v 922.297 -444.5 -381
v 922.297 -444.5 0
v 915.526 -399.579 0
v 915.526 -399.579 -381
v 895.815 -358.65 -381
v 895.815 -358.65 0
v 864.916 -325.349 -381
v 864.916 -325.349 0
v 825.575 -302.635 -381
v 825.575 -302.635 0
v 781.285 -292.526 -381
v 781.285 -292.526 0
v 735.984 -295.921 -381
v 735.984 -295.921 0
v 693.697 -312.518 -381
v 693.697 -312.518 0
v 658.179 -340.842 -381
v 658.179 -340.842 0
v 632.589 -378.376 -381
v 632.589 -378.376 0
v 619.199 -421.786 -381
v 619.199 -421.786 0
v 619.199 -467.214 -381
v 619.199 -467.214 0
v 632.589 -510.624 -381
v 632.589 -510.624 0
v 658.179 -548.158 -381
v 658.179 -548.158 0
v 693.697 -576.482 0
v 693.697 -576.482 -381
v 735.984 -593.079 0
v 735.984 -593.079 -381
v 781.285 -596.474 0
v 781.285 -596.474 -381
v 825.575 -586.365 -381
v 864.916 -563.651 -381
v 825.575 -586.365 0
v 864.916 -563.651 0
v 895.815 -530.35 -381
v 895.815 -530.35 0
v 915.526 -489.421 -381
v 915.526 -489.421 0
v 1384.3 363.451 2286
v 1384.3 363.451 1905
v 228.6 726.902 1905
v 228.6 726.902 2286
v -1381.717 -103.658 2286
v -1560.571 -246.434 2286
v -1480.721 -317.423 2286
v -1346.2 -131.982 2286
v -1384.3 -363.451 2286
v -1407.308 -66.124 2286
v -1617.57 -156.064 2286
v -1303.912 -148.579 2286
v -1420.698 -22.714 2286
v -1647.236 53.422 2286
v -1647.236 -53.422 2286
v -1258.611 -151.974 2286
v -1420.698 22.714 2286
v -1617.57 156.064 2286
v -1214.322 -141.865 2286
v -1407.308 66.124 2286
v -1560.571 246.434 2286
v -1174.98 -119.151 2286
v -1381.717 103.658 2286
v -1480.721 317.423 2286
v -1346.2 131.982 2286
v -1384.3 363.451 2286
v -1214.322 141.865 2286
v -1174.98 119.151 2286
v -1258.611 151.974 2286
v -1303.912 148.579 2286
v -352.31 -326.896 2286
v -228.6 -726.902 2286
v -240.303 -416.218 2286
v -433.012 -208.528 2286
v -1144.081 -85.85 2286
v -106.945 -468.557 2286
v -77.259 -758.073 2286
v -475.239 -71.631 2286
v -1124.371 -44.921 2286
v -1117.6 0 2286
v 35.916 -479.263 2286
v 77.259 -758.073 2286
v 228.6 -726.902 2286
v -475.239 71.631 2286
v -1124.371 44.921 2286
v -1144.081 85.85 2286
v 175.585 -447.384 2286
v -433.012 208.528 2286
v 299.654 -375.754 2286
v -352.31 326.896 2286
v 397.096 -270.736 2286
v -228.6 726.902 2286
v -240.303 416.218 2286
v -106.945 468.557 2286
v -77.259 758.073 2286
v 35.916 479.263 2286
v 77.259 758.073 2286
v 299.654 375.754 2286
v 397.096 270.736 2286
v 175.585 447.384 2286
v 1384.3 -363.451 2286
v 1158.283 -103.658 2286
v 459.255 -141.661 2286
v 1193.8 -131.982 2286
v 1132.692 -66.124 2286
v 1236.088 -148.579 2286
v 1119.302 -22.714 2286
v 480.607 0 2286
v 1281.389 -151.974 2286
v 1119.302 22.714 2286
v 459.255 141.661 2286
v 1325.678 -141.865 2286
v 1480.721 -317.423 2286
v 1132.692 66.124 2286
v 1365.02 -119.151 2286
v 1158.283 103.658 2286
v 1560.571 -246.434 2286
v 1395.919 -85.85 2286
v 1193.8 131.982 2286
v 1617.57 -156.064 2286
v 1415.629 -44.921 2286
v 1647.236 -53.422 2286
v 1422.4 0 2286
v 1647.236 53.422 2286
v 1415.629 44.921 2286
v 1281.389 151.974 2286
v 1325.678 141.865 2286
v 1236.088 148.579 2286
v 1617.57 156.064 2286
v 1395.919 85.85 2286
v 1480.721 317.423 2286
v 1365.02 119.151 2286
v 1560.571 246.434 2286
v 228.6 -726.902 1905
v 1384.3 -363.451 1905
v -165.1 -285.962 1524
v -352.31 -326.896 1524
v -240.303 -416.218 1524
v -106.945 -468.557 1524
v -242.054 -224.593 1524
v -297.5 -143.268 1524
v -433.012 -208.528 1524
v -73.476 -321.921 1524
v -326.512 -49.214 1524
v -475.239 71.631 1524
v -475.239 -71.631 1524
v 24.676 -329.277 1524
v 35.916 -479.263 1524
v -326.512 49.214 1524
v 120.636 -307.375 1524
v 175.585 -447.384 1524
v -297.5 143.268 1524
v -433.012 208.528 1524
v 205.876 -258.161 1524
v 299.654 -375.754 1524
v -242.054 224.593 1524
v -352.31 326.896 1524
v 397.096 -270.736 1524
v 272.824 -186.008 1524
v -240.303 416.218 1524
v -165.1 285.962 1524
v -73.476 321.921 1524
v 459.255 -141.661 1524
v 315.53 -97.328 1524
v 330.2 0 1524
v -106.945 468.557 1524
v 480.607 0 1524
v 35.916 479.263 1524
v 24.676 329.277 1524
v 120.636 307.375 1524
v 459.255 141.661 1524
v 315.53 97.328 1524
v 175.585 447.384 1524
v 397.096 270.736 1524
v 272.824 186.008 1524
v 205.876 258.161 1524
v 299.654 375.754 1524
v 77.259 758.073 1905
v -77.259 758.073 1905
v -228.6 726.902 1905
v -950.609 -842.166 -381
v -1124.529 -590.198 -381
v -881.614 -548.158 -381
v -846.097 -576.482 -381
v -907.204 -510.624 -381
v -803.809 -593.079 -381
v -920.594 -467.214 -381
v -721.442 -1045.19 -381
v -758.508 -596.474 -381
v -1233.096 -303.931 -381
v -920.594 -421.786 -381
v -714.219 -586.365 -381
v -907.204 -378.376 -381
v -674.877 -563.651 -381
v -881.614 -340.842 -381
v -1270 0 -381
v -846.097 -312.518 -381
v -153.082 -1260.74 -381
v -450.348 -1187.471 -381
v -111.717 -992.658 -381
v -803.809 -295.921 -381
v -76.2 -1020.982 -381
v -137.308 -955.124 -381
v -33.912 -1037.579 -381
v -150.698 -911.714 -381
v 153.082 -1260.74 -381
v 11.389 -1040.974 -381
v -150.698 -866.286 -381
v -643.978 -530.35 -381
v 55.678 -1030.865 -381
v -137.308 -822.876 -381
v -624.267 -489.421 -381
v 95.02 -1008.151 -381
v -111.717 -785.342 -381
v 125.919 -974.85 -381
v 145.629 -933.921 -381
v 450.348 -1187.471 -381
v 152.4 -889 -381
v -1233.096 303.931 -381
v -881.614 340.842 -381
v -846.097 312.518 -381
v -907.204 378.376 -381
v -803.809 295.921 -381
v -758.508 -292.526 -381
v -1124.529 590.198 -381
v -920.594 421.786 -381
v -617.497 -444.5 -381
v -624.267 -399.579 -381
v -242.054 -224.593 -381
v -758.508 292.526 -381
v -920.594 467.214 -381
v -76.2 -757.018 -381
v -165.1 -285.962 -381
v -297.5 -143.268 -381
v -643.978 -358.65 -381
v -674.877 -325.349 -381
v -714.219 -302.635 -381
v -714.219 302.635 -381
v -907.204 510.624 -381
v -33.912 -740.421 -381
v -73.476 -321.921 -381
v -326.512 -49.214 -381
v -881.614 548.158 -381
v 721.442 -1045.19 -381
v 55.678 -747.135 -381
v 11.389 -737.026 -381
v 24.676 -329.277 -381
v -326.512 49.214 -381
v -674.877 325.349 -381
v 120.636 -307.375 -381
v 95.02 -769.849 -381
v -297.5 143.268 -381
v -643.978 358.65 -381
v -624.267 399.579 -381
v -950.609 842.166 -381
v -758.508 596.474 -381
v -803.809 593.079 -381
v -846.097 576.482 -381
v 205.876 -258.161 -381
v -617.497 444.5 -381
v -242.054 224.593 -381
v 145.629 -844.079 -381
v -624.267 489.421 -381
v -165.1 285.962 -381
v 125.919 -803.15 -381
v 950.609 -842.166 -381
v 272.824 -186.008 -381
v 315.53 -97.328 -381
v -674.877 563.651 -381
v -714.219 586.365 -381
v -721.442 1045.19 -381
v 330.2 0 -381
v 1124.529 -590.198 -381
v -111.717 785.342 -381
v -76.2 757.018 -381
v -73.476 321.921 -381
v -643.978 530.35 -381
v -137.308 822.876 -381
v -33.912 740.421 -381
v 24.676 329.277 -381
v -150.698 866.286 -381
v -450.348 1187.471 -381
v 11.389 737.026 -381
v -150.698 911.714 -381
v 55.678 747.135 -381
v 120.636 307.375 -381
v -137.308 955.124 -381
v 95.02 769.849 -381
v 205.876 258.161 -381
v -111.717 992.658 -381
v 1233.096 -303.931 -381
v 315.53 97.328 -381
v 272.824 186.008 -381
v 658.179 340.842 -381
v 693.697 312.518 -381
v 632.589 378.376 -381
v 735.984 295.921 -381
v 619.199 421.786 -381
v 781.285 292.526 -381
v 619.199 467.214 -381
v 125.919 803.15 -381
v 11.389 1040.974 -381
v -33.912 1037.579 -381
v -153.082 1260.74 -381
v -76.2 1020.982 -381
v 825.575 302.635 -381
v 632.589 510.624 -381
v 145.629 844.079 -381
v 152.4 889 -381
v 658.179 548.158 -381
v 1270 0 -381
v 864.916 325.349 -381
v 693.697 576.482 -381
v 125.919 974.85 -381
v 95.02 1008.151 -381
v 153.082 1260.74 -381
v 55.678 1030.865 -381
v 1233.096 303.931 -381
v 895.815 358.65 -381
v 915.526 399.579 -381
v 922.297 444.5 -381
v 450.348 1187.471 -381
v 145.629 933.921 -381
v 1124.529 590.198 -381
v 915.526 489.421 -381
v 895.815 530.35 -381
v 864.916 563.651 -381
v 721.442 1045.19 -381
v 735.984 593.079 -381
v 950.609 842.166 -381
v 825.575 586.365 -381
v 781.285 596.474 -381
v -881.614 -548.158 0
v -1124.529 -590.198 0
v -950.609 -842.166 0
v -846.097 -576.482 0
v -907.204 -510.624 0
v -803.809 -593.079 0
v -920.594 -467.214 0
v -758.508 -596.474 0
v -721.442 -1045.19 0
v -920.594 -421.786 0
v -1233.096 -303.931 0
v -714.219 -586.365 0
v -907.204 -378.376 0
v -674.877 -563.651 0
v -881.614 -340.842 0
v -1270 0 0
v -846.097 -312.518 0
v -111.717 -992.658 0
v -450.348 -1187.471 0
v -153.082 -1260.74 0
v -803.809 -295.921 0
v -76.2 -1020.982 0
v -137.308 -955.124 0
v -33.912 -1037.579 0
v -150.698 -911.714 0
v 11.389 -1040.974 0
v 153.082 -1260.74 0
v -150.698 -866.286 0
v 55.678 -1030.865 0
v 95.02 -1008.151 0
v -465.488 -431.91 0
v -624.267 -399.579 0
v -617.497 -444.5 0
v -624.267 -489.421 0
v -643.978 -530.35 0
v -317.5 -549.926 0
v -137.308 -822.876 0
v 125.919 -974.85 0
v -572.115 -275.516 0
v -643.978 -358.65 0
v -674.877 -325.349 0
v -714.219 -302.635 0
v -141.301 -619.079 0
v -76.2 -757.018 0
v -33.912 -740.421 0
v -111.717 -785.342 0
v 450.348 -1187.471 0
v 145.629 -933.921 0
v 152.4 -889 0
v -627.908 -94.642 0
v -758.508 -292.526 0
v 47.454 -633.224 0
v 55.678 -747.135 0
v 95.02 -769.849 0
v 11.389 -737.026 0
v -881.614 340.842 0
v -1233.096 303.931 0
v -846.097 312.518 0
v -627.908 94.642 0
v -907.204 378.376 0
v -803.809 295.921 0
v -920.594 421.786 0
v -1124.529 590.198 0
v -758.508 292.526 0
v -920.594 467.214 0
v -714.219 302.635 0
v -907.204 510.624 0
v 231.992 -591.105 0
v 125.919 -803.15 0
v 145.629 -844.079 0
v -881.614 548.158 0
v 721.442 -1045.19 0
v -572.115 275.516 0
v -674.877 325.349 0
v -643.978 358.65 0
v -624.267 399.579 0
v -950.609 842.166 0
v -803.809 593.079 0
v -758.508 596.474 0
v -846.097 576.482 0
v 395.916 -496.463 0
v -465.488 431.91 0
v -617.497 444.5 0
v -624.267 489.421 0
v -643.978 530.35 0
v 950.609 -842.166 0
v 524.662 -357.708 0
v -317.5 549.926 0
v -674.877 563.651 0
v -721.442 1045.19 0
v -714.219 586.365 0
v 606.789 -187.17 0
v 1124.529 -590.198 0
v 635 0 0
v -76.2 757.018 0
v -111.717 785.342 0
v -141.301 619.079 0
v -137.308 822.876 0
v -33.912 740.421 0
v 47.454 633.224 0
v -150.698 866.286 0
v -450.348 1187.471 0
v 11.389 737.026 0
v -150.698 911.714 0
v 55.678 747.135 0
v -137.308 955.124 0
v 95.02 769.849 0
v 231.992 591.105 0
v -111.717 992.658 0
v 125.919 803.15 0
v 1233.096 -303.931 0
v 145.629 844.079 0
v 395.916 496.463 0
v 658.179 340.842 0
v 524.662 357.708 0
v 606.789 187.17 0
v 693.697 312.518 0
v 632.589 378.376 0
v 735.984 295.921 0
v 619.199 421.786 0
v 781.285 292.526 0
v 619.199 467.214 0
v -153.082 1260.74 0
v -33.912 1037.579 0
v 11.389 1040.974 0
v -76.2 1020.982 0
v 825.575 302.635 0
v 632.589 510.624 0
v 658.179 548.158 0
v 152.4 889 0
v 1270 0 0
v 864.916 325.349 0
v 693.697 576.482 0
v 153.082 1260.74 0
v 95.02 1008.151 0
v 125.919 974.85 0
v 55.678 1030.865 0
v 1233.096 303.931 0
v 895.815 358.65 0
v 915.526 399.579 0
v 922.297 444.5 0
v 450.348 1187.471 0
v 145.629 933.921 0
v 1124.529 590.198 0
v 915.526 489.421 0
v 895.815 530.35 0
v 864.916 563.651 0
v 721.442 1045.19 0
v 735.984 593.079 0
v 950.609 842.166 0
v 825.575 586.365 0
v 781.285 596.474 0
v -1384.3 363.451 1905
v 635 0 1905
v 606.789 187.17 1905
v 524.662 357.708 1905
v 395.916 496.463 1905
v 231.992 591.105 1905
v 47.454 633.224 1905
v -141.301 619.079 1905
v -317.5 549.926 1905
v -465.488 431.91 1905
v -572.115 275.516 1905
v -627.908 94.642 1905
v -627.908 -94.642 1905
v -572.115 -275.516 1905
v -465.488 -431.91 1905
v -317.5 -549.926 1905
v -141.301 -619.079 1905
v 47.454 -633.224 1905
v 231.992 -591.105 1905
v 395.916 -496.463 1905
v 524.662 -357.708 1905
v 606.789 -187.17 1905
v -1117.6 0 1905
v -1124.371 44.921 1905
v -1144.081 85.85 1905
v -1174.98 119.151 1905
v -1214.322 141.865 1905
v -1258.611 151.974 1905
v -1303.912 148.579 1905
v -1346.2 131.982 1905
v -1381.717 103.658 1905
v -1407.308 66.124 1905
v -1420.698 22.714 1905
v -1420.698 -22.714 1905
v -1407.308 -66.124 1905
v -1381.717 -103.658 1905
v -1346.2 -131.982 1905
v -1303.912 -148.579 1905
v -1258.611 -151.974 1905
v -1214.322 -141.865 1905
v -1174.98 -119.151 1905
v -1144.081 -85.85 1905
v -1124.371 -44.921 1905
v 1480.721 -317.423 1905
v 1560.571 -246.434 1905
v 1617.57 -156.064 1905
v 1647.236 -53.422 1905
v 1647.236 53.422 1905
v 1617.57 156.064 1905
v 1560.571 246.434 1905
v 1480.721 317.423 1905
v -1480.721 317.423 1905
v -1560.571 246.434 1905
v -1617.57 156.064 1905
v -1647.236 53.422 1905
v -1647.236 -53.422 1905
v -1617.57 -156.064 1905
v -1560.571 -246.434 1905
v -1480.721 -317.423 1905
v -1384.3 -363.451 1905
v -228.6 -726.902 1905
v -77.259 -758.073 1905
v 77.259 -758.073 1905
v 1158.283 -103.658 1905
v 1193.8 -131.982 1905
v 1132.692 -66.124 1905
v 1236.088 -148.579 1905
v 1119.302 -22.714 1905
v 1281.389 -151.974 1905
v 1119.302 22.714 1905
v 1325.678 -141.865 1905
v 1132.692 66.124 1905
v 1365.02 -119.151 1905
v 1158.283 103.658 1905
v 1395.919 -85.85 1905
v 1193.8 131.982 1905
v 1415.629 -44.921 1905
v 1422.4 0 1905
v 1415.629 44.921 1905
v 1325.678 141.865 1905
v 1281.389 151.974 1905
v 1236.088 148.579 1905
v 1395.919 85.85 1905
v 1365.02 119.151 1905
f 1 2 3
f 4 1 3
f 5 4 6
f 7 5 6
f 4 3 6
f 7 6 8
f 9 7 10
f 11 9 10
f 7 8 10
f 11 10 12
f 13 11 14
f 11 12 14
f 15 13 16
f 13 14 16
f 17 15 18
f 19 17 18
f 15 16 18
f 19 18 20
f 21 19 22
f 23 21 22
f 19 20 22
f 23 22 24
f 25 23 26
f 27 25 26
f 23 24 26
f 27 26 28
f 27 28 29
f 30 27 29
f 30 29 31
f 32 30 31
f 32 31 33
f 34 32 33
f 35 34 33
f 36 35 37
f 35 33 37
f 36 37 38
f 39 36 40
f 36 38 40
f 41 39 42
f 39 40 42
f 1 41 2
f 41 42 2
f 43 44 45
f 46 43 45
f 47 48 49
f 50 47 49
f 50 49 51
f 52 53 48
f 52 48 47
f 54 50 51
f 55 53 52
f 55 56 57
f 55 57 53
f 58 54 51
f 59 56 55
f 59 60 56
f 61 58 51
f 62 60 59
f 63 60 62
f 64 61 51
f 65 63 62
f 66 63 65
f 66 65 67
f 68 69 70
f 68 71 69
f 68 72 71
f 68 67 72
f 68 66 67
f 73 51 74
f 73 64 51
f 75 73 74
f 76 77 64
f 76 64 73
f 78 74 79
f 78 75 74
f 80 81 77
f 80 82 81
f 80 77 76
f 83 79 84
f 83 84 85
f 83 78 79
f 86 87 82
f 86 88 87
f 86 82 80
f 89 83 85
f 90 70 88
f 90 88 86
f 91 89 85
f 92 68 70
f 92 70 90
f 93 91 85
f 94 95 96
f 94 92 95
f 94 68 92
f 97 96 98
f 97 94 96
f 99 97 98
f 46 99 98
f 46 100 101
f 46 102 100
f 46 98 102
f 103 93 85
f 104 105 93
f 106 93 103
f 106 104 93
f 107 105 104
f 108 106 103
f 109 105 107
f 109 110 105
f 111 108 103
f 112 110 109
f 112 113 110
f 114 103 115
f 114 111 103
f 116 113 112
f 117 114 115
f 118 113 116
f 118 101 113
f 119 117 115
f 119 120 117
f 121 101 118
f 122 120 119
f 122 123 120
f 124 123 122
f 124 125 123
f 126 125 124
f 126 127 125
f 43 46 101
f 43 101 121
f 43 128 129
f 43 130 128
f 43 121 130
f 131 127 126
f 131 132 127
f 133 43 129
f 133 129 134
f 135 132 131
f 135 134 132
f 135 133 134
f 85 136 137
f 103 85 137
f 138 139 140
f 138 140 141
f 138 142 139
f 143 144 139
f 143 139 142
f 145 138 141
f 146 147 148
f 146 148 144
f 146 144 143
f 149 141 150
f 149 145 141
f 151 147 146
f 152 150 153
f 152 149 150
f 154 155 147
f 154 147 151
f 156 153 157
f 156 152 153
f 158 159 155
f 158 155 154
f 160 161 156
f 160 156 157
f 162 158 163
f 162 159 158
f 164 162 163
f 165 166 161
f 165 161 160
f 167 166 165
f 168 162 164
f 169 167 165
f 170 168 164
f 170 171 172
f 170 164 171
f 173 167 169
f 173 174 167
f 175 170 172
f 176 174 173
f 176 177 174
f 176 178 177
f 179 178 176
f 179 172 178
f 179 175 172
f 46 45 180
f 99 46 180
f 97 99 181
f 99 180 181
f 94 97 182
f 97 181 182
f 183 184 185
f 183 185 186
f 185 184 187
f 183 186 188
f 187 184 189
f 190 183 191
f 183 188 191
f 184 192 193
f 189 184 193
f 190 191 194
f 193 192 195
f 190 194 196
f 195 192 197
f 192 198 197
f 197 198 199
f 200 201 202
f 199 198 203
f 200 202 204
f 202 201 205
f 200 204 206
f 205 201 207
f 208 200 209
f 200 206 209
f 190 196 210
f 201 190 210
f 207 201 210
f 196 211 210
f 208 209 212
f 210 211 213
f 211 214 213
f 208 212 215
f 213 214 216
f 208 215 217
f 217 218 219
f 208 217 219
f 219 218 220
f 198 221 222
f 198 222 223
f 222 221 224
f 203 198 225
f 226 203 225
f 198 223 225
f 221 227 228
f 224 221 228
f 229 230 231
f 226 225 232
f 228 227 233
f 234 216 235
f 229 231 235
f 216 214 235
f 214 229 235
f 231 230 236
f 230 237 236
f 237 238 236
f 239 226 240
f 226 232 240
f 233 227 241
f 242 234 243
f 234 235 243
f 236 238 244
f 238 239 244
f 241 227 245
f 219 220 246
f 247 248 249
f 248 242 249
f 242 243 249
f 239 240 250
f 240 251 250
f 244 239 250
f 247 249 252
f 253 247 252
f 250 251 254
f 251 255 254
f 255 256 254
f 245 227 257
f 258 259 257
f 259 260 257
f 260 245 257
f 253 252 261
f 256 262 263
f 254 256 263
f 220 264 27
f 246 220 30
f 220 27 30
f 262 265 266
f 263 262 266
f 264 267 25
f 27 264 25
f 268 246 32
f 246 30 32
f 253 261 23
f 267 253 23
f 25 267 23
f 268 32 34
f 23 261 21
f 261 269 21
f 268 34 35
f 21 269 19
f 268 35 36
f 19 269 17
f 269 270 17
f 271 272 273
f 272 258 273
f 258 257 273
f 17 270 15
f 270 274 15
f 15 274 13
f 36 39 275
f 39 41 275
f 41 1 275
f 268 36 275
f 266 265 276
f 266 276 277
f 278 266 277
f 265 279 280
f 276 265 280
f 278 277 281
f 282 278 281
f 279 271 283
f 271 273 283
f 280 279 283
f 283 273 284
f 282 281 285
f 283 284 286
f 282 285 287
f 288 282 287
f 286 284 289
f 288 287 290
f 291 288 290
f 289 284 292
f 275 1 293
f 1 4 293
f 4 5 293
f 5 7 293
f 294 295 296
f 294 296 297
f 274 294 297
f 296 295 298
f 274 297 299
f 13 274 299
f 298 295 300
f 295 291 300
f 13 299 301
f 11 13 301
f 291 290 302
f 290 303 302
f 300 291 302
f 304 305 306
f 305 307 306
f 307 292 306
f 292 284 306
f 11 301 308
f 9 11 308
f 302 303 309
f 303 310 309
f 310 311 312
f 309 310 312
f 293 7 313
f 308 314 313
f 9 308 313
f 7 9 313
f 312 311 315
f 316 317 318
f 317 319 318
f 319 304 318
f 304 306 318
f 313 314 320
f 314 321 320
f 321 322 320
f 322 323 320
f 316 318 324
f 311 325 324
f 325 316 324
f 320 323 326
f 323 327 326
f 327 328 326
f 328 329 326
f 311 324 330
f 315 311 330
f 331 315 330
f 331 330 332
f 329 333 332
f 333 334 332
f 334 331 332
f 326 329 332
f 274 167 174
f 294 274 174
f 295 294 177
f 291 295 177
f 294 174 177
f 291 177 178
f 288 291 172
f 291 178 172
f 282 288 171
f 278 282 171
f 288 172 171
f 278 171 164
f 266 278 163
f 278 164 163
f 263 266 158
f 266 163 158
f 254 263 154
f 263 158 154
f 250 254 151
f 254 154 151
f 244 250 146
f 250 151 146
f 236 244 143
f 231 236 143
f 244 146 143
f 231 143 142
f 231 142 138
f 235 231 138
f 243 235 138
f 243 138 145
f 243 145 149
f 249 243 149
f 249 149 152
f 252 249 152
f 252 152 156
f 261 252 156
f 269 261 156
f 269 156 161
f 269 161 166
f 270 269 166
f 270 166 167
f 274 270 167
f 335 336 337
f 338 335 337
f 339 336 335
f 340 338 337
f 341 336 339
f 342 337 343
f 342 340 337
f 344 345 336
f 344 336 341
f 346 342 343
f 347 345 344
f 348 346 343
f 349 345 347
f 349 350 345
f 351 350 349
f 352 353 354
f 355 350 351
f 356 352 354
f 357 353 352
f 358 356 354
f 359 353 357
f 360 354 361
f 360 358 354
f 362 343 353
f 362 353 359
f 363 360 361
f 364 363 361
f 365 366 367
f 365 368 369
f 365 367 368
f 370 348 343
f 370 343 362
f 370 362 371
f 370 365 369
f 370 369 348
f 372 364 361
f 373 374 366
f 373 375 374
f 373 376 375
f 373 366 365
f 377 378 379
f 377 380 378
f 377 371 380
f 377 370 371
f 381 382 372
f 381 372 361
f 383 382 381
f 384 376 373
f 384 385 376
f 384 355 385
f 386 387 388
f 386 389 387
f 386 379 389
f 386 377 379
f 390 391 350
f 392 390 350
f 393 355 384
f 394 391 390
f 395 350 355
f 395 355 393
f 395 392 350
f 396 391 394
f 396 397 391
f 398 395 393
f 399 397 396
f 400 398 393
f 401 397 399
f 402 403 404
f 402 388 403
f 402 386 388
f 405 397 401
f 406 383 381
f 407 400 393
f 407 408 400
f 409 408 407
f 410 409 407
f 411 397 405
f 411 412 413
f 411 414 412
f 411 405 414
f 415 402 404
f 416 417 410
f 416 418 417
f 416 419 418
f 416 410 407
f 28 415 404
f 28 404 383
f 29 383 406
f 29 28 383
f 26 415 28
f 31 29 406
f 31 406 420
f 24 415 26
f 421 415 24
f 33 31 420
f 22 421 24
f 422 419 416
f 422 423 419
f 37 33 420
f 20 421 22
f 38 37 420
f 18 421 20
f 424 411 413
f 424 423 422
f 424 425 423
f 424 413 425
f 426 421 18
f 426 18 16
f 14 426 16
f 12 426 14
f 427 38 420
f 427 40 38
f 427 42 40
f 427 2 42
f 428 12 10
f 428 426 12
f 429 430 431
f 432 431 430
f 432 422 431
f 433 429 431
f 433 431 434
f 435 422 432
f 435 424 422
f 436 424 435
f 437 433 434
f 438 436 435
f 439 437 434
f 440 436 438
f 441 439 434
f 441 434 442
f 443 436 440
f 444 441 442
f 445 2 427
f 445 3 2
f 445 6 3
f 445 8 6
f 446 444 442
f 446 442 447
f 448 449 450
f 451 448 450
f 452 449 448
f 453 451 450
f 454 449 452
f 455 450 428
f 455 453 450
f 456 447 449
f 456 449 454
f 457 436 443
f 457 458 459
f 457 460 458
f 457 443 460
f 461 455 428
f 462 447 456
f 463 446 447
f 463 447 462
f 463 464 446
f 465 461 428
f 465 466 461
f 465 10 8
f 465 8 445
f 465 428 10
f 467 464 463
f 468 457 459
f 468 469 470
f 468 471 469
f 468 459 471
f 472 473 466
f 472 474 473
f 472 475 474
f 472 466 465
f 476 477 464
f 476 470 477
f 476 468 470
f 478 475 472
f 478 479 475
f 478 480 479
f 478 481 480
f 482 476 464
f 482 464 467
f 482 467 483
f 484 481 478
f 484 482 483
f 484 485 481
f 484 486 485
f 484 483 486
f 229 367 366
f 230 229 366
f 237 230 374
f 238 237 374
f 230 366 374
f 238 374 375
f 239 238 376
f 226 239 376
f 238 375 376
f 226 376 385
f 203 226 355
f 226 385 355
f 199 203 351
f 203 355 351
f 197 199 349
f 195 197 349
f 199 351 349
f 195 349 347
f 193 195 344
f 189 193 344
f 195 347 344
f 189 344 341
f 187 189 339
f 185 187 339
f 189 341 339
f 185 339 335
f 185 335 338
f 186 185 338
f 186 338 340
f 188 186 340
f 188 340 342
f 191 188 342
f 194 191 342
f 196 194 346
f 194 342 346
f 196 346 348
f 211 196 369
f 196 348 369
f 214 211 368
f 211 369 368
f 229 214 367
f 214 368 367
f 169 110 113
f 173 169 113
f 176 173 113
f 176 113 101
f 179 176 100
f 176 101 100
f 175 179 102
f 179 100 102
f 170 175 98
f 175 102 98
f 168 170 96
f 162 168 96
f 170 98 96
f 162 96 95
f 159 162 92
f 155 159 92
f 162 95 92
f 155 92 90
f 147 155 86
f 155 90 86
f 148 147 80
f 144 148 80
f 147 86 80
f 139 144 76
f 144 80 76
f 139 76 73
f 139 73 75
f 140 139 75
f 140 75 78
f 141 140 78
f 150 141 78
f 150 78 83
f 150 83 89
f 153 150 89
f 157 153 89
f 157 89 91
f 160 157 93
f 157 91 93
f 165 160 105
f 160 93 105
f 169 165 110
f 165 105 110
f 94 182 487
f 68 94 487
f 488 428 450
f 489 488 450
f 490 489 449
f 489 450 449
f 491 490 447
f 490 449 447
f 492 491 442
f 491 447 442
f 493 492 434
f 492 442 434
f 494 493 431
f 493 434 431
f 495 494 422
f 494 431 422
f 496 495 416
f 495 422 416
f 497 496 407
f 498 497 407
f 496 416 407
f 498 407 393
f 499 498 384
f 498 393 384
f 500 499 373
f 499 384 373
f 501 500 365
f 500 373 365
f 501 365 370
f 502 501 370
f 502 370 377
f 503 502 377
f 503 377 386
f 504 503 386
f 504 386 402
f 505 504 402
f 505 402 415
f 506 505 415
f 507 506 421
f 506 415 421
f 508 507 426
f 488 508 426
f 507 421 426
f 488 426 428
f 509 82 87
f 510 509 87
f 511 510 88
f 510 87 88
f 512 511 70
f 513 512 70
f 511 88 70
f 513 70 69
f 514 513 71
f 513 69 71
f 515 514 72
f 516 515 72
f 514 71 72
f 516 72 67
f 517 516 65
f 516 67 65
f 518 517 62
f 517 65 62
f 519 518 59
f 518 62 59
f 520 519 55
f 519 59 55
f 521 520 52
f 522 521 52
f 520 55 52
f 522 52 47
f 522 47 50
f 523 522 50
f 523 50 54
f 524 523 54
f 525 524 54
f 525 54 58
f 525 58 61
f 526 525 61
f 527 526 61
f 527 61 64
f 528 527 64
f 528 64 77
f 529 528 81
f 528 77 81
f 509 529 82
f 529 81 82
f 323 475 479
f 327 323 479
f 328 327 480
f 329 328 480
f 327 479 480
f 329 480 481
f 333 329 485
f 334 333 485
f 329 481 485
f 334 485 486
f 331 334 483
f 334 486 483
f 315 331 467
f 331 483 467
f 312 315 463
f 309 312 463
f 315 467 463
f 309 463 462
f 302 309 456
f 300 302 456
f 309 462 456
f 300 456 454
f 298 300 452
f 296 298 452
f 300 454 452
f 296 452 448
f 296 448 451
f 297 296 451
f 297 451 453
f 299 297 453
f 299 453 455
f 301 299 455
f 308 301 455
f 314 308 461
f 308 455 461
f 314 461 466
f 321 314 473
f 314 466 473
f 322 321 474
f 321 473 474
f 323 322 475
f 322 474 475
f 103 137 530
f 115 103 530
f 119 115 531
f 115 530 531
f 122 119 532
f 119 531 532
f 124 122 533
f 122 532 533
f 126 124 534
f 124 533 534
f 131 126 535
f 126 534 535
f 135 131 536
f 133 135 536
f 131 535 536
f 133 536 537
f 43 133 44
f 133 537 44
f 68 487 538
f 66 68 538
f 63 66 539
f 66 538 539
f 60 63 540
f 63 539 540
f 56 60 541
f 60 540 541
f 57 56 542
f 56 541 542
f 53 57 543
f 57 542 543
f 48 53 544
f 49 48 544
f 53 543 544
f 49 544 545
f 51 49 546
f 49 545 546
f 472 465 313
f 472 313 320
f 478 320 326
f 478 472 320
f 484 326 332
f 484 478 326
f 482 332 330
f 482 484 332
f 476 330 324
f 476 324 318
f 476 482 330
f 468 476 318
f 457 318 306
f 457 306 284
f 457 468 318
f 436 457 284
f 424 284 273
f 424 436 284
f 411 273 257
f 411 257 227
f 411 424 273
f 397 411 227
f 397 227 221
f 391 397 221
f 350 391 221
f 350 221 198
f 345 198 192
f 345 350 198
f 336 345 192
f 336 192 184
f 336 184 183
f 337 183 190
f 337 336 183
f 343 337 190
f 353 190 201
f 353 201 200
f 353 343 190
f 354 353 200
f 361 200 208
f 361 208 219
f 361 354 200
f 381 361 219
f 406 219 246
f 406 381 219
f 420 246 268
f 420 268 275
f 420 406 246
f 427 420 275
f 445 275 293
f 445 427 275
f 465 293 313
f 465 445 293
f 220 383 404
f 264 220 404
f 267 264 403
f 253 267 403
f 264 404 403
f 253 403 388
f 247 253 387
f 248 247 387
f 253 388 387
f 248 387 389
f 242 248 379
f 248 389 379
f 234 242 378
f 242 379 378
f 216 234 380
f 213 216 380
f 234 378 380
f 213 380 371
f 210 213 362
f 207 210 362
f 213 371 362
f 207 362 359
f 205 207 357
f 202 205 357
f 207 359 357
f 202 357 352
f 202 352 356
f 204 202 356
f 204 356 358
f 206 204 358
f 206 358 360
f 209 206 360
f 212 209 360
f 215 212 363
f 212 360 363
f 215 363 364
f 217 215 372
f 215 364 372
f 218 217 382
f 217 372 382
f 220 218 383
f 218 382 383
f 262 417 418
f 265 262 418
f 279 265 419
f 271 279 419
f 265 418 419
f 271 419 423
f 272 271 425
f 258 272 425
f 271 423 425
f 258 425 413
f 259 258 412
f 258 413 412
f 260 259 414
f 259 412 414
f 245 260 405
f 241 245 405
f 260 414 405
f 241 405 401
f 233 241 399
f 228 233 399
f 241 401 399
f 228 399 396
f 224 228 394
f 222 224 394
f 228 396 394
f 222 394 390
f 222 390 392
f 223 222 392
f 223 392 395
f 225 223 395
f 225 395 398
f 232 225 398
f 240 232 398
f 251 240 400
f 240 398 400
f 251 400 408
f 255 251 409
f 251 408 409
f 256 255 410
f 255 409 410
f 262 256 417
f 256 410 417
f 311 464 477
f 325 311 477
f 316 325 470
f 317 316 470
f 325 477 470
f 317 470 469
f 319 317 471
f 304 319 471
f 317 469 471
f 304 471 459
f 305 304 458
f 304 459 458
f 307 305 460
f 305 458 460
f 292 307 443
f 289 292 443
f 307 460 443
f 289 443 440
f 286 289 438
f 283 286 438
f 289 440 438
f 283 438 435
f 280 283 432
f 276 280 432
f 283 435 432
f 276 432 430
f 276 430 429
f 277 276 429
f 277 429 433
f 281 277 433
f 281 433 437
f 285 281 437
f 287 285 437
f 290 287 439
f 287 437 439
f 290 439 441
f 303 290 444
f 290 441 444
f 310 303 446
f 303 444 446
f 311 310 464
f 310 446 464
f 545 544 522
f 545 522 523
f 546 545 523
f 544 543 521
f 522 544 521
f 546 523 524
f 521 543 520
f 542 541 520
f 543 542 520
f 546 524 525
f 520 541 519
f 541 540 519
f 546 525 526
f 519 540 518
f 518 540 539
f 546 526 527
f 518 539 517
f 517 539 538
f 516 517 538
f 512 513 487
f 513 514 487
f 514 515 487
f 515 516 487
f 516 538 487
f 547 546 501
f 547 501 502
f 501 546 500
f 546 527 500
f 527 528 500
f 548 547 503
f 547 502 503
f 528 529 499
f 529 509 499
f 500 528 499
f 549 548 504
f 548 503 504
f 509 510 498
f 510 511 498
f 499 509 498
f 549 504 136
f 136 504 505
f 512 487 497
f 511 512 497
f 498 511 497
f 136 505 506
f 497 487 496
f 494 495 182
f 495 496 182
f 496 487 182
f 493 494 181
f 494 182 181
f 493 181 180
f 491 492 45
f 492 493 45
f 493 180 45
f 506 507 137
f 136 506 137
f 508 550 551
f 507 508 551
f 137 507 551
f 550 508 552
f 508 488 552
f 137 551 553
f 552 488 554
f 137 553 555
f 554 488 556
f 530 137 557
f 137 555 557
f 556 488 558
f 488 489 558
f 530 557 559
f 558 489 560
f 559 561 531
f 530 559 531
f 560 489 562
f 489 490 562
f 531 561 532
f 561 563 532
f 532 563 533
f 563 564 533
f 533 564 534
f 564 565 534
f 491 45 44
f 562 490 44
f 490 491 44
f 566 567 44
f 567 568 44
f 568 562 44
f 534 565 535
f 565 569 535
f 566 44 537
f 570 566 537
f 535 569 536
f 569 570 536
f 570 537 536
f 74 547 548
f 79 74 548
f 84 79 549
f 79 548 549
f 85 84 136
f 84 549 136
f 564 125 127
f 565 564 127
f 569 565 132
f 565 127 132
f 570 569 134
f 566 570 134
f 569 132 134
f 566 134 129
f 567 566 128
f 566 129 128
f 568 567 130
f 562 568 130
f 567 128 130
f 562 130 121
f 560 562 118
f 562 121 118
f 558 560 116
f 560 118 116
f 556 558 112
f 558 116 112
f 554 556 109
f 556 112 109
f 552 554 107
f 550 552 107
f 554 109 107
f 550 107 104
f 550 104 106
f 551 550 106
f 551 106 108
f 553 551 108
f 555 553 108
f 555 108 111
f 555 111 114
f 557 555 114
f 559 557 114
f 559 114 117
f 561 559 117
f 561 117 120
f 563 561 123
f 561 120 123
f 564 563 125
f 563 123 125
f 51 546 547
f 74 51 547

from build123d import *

# Parameters (mm, degrees)
F0_R      = 1270
F0_R_2    = 152.4
F1_DEPTH  = 381
F2_R      = 635
F3_DEPTH  = 1905
F5_DEPTH  = 381
F6_DEPTH  = 381
F7_R      = 330.2
F8_DEPTH  = 2667
F9_R      = 480.606922
F10_DEPTH = 762
F11_R     = 152.4
F12_DEPTH = 381


with BuildPart() as f1:
    # F0 (on Top) → F1 (new body)
    with BuildSketch(Plane.XY):
        Circle(F0_R)
        with Locations((-769.896584, -444.5)):
            Circle(F0_R_2, mode=Mode.SUBTRACT)
        with Locations((0, -889)):
            Circle(F0_R_2, mode=Mode.SUBTRACT)
        with Locations((769.896584, -444.5)):
            Circle(F0_R_2, mode=Mode.SUBTRACT)
        with Locations((-769.896584, 444.5)):
            Circle(F0_R_2, mode=Mode.SUBTRACT)
        with Locations((769.896584, 444.5)):
            Circle(F0_R_2, mode=Mode.SUBTRACT)
        with Locations((0, 889)):
            Circle(F0_R_2, mode=Mode.SUBTRACT)
    extrude(amount=-F1_DEPTH)

    # F2 (on face) → F3 (join)
    with BuildSketch(Plane.XY):
        Circle(F2_R)
    extrude(amount=F3_DEPTH)

    # F4 (on face) → F5 (join)
    with BuildSketch(Plane.XY.offset(1905)):
        with BuildLine():
            Line((228.6, -726.901671), (1384.3, -363.450836))
            ThreePointArc((1384.3, -363.450836), (1651, 0), (1384.3, 363.450836))
            Line((1384.3, 363.450836), (228.6, 726.901671))
            ThreePointArc((228.6, 726.901671), (614.34404, 450.805279), (762, 0))
            ThreePointArc((762, 0), (614.34404, -450.805279), (228.6, -726.901671))
        make_face()
        with BuildLine():
            ThreePointArc((-228.6, -726.901671), (0, -762), (228.6, -726.901671))
            ThreePointArc((228.6, -726.901671), (614.34404, -450.805279), (762, 0))
            ThreePointArc((762, 0), (614.34404, 450.805279), (228.6, 726.901671))
            ThreePointArc((228.6, 726.901671), (0, 762), (-228.6, 726.901671))
            ThreePointArc((-228.6, 726.901671), (-762, 0), (-228.6, -726.901671))
        make_face()
        with BuildLine():
            Line((-1384.3, -363.450836), (-228.6, -726.901671))
            ThreePointArc((-228.6, -726.901671), (-762, 0), (-228.6, 726.901671))
            Line((-228.6, 726.901671), (-1384.3, 363.450836))
            ThreePointArc((-1384.3, 363.450836), (-1651, 0), (-1384.3, -363.450836))
        make_face()
    extrude(amount=F5_DEPTH)

    # F4 (on face) → F6 (join)
    with BuildSketch(Plane.XY.offset(1905)):
        with BuildLine():
            Line((228.6, -726.901671), (1384.3, -363.450836))
            ThreePointArc((1384.3, -363.450836), (1651, 0), (1384.3, 363.450836))
            Line((1384.3, 363.450836), (228.6, 726.901671))
            ThreePointArc((228.6, 726.901671), (614.34404, 450.805279), (762, 0))
            ThreePointArc((762, 0), (614.34404, -450.805279), (228.6, -726.901671))
        make_face()
        with BuildLine():
            ThreePointArc((-228.6, -726.901671), (0, -762), (228.6, -726.901671))
            ThreePointArc((228.6, -726.901671), (614.34404, -450.805279), (762, 0))
            ThreePointArc((762, 0), (614.34404, 450.805279), (228.6, 726.901671))
            ThreePointArc((228.6, 726.901671), (0, 762), (-228.6, 726.901671))
            ThreePointArc((-228.6, 726.901671), (-762, 0), (-228.6, -726.901671))
        make_face()
        with BuildLine():
            Line((-1384.3, -363.450836), (-228.6, -726.901671))
            ThreePointArc((-228.6, -726.901671), (-762, 0), (-228.6, 726.901671))
            Line((-228.6, 726.901671), (-1384.3, 363.450836))
            ThreePointArc((-1384.3, 363.450836), (-1651, 0), (-1384.3, -363.450836))
        make_face()
    extrude(amount=F6_DEPTH)

    # F7 (on face) → F8 (cut)
    with BuildSketch(Plane.XY.offset(2286)):
        Circle(F7_R)
    extrude(amount=-F8_DEPTH, mode=Mode.SUBTRACT)

    # F9 (on face) → F10 (cut)
    with BuildSketch(Plane.XY.offset(2286)):
        Circle(F9_R)
    extrude(amount=-F10_DEPTH, mode=Mode.SUBTRACT)

    # F11 (on face) → F12 (cut)
    with BuildSketch(Plane.XY.offset(2286)):
        with Locations((1270, 0)):
            Circle(F11_R)
        with Locations((-1270, 0)):
            Circle(F11_R)
    extrude(amount=-F12_DEPTH, mode=Mode.SUBTRACT)


solid = f1.part
